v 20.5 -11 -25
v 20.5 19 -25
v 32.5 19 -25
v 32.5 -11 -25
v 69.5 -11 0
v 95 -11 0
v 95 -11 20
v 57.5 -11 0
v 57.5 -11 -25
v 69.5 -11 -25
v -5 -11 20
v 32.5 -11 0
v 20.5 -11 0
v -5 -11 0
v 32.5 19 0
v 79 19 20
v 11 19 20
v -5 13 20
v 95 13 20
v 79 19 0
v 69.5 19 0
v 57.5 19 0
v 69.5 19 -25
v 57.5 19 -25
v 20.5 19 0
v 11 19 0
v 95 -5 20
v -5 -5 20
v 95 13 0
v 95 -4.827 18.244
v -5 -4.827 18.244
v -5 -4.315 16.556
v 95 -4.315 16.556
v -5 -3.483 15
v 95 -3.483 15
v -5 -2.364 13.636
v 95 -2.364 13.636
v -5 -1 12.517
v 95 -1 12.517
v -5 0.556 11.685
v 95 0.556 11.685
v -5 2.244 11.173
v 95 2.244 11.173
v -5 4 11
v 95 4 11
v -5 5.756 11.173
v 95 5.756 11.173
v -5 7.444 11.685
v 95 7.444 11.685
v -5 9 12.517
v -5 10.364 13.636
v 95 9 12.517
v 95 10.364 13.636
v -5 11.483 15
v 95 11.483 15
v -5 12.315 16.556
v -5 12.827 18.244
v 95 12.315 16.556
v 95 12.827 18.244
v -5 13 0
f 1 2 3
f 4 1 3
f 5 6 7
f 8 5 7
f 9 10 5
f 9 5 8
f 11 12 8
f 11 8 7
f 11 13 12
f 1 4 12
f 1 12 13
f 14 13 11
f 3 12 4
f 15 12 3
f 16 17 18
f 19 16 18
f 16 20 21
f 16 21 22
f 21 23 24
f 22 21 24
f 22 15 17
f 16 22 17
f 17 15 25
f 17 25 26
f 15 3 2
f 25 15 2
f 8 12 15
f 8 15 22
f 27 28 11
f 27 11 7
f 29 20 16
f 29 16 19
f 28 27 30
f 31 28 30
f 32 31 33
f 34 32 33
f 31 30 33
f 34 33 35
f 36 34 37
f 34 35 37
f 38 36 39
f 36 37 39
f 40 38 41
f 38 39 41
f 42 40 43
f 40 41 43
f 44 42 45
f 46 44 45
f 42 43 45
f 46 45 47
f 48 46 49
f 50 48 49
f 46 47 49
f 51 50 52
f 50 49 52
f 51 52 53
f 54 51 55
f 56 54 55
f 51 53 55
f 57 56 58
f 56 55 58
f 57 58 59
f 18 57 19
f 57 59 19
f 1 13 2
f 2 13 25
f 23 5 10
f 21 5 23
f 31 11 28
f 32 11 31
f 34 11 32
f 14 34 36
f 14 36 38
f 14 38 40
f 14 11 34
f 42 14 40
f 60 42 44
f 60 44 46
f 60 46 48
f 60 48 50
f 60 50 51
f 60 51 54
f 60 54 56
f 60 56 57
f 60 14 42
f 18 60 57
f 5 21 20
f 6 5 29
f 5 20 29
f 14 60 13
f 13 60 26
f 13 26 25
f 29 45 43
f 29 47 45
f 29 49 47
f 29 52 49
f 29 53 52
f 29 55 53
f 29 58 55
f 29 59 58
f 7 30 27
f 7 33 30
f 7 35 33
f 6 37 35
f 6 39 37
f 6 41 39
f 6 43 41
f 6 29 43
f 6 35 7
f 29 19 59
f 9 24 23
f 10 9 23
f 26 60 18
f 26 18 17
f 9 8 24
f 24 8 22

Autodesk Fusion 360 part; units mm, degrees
sketch "Sketch1" plane through (0, 0, 0) normal (0, 0, 1) x (1, 0, 0)
sketch "Sketch2" plane through (0, 0, 0) normal (0, 0, 1) x (1, 0, 0)
  line L0 (-5, -5) -> (95, -5)
  line L1 (95, -5) -> (95, 13)
  line L2 (95, 13) -> (-5, 13)
  line L3 (-5, 13) -> (-5, -5)
  line L4 (-5, 13) -> (11, 13)
  line L5 (95, 13) -> (79, 13)
  line L6 (11, 13) -> (79, 13)
  line L7 (79, 13) -> (79, 19)
  line L8 (79, 19) -> (11, 19)
  line L9 (11, 19) -> (11, 13)
  line L10 (11, -5) -> (79, -5)
  line L11 (79, -5) -> (79, -11)
  line L12 (79, -11) -> (11, -11)
  line L13 (11, -11) -> (11, -5)
  line L14 (11, -11) -> (-5, -5)
  line L15 (-5, 13) -> (11, 19)
  line L16 (79, 19) -> (95, 13)
  line L17 (95, -5) -> (79, -11)
  dimension "d1" = 100
  dimension "d2" = 18
  dimension "d3" = 16
  dimension "d4" = 16
  dimension "d5" = 68
  dimension "d6" = 6
  dimension "d7" = 68
  dimension "d8" = 6
extrude "Extrude1" add sketch "Sketch2" along normal blind 20
sketch "Sketch3" plane through (95, 0, 0) normal (1, 0, 0) x (0, 1, 0)
  line L0 (-5, 0) -> (13, 0)
  line L1 (13, 0) -> (13, 20)
  line L2 (13, 20) -> (-5, 20)
  line L3 (-5, 20) -> (-5, 0)
  line L4 (-5, 20) -> (4, 20)
  arc A0 (-5, 20) -> (13, 20) centre (4, 20) ccw
  dimension "d11" = 9
  dimension "d12" = 18
extrude "Extrude2" cut sketch "Sketch3" against normal blind 100 contours L2 L4 A0
sketch "Sketch4" plane through (0, 0, 0) normal (0, 0, 1) x (1, 0, 0)
  line L0 (79, -11) -> (69.5, -11)
  line L1 (69.5, -11) -> (69.5, 19)
  line L2 (69.5, 19) -> (79, 19)
  line L3 (79, 19) -> (79, -11)
  line L4 (11, -11) -> (20.5, -11)
  line L5 (20.5, -11) -> (20.5, 19)
  line L6 (20.5, 19) -> (11, 19)
  line L7 (11, 19) -> (11, -11)
  line L8 (20.5, -11) -> (32.5, -11)
  line L9 (32.5, -11) -> (32.5, 19)
  line L10 (32.5, 19) -> (20.5, 19)
  line L11 (20.5, 19) -> (20.5, -11)
  line L12 (69.5, -11) -> (57.5, -11)
  line L13 (57.5, -11) -> (57.5, 19)
  line L14 (57.5, 19) -> (69.5, 19)
  line L15 (69.5, 19) -> (69.5, -11)
  dimension "d15" = 9.5
  dimension "d16" = 30
  dimension "d17" = 9.5
  dimension "d18" = 30
  dimension "d19" = 12
  dimension "d20" = 30
  dimension "d21" = 12
  dimension "d22" = 30
extrude "Extrude3" add sketch "Sketch4" against normal blind 25 contours L1 L12 L13 L14 L15 | L5 L8 L9 L10 L11
sketch "Sketch5" plane through (13.3562, -35.6164, 0) normal (0.3511, -0.9363, 0) x (0.9363, 0.3511, 0)
  line L0 (70.1076, 0) -> (87.1957, 0)
  line L1 (87.1957, 0) -> (87.1957, 20)
  line L2 (87.1957, 20) -> (70.1076, 20)
  line L3 (70.1076, 20) -> (70.1076, 0)
sketch "Sketch6" plane through (0, 0, 0) normal (0, 0, 1) x (1, 0, 0)
  line L0 (-5, -5) -> (95, -5)
  line L1 (95, -5) -> (95, -11)
  line L2 (95, -11) -> (-5, -11)
  line L3 (-5, -11) -> (-5, -5)
extrude "Extrude4" add sketch "Sketch6" along normal blind 20
